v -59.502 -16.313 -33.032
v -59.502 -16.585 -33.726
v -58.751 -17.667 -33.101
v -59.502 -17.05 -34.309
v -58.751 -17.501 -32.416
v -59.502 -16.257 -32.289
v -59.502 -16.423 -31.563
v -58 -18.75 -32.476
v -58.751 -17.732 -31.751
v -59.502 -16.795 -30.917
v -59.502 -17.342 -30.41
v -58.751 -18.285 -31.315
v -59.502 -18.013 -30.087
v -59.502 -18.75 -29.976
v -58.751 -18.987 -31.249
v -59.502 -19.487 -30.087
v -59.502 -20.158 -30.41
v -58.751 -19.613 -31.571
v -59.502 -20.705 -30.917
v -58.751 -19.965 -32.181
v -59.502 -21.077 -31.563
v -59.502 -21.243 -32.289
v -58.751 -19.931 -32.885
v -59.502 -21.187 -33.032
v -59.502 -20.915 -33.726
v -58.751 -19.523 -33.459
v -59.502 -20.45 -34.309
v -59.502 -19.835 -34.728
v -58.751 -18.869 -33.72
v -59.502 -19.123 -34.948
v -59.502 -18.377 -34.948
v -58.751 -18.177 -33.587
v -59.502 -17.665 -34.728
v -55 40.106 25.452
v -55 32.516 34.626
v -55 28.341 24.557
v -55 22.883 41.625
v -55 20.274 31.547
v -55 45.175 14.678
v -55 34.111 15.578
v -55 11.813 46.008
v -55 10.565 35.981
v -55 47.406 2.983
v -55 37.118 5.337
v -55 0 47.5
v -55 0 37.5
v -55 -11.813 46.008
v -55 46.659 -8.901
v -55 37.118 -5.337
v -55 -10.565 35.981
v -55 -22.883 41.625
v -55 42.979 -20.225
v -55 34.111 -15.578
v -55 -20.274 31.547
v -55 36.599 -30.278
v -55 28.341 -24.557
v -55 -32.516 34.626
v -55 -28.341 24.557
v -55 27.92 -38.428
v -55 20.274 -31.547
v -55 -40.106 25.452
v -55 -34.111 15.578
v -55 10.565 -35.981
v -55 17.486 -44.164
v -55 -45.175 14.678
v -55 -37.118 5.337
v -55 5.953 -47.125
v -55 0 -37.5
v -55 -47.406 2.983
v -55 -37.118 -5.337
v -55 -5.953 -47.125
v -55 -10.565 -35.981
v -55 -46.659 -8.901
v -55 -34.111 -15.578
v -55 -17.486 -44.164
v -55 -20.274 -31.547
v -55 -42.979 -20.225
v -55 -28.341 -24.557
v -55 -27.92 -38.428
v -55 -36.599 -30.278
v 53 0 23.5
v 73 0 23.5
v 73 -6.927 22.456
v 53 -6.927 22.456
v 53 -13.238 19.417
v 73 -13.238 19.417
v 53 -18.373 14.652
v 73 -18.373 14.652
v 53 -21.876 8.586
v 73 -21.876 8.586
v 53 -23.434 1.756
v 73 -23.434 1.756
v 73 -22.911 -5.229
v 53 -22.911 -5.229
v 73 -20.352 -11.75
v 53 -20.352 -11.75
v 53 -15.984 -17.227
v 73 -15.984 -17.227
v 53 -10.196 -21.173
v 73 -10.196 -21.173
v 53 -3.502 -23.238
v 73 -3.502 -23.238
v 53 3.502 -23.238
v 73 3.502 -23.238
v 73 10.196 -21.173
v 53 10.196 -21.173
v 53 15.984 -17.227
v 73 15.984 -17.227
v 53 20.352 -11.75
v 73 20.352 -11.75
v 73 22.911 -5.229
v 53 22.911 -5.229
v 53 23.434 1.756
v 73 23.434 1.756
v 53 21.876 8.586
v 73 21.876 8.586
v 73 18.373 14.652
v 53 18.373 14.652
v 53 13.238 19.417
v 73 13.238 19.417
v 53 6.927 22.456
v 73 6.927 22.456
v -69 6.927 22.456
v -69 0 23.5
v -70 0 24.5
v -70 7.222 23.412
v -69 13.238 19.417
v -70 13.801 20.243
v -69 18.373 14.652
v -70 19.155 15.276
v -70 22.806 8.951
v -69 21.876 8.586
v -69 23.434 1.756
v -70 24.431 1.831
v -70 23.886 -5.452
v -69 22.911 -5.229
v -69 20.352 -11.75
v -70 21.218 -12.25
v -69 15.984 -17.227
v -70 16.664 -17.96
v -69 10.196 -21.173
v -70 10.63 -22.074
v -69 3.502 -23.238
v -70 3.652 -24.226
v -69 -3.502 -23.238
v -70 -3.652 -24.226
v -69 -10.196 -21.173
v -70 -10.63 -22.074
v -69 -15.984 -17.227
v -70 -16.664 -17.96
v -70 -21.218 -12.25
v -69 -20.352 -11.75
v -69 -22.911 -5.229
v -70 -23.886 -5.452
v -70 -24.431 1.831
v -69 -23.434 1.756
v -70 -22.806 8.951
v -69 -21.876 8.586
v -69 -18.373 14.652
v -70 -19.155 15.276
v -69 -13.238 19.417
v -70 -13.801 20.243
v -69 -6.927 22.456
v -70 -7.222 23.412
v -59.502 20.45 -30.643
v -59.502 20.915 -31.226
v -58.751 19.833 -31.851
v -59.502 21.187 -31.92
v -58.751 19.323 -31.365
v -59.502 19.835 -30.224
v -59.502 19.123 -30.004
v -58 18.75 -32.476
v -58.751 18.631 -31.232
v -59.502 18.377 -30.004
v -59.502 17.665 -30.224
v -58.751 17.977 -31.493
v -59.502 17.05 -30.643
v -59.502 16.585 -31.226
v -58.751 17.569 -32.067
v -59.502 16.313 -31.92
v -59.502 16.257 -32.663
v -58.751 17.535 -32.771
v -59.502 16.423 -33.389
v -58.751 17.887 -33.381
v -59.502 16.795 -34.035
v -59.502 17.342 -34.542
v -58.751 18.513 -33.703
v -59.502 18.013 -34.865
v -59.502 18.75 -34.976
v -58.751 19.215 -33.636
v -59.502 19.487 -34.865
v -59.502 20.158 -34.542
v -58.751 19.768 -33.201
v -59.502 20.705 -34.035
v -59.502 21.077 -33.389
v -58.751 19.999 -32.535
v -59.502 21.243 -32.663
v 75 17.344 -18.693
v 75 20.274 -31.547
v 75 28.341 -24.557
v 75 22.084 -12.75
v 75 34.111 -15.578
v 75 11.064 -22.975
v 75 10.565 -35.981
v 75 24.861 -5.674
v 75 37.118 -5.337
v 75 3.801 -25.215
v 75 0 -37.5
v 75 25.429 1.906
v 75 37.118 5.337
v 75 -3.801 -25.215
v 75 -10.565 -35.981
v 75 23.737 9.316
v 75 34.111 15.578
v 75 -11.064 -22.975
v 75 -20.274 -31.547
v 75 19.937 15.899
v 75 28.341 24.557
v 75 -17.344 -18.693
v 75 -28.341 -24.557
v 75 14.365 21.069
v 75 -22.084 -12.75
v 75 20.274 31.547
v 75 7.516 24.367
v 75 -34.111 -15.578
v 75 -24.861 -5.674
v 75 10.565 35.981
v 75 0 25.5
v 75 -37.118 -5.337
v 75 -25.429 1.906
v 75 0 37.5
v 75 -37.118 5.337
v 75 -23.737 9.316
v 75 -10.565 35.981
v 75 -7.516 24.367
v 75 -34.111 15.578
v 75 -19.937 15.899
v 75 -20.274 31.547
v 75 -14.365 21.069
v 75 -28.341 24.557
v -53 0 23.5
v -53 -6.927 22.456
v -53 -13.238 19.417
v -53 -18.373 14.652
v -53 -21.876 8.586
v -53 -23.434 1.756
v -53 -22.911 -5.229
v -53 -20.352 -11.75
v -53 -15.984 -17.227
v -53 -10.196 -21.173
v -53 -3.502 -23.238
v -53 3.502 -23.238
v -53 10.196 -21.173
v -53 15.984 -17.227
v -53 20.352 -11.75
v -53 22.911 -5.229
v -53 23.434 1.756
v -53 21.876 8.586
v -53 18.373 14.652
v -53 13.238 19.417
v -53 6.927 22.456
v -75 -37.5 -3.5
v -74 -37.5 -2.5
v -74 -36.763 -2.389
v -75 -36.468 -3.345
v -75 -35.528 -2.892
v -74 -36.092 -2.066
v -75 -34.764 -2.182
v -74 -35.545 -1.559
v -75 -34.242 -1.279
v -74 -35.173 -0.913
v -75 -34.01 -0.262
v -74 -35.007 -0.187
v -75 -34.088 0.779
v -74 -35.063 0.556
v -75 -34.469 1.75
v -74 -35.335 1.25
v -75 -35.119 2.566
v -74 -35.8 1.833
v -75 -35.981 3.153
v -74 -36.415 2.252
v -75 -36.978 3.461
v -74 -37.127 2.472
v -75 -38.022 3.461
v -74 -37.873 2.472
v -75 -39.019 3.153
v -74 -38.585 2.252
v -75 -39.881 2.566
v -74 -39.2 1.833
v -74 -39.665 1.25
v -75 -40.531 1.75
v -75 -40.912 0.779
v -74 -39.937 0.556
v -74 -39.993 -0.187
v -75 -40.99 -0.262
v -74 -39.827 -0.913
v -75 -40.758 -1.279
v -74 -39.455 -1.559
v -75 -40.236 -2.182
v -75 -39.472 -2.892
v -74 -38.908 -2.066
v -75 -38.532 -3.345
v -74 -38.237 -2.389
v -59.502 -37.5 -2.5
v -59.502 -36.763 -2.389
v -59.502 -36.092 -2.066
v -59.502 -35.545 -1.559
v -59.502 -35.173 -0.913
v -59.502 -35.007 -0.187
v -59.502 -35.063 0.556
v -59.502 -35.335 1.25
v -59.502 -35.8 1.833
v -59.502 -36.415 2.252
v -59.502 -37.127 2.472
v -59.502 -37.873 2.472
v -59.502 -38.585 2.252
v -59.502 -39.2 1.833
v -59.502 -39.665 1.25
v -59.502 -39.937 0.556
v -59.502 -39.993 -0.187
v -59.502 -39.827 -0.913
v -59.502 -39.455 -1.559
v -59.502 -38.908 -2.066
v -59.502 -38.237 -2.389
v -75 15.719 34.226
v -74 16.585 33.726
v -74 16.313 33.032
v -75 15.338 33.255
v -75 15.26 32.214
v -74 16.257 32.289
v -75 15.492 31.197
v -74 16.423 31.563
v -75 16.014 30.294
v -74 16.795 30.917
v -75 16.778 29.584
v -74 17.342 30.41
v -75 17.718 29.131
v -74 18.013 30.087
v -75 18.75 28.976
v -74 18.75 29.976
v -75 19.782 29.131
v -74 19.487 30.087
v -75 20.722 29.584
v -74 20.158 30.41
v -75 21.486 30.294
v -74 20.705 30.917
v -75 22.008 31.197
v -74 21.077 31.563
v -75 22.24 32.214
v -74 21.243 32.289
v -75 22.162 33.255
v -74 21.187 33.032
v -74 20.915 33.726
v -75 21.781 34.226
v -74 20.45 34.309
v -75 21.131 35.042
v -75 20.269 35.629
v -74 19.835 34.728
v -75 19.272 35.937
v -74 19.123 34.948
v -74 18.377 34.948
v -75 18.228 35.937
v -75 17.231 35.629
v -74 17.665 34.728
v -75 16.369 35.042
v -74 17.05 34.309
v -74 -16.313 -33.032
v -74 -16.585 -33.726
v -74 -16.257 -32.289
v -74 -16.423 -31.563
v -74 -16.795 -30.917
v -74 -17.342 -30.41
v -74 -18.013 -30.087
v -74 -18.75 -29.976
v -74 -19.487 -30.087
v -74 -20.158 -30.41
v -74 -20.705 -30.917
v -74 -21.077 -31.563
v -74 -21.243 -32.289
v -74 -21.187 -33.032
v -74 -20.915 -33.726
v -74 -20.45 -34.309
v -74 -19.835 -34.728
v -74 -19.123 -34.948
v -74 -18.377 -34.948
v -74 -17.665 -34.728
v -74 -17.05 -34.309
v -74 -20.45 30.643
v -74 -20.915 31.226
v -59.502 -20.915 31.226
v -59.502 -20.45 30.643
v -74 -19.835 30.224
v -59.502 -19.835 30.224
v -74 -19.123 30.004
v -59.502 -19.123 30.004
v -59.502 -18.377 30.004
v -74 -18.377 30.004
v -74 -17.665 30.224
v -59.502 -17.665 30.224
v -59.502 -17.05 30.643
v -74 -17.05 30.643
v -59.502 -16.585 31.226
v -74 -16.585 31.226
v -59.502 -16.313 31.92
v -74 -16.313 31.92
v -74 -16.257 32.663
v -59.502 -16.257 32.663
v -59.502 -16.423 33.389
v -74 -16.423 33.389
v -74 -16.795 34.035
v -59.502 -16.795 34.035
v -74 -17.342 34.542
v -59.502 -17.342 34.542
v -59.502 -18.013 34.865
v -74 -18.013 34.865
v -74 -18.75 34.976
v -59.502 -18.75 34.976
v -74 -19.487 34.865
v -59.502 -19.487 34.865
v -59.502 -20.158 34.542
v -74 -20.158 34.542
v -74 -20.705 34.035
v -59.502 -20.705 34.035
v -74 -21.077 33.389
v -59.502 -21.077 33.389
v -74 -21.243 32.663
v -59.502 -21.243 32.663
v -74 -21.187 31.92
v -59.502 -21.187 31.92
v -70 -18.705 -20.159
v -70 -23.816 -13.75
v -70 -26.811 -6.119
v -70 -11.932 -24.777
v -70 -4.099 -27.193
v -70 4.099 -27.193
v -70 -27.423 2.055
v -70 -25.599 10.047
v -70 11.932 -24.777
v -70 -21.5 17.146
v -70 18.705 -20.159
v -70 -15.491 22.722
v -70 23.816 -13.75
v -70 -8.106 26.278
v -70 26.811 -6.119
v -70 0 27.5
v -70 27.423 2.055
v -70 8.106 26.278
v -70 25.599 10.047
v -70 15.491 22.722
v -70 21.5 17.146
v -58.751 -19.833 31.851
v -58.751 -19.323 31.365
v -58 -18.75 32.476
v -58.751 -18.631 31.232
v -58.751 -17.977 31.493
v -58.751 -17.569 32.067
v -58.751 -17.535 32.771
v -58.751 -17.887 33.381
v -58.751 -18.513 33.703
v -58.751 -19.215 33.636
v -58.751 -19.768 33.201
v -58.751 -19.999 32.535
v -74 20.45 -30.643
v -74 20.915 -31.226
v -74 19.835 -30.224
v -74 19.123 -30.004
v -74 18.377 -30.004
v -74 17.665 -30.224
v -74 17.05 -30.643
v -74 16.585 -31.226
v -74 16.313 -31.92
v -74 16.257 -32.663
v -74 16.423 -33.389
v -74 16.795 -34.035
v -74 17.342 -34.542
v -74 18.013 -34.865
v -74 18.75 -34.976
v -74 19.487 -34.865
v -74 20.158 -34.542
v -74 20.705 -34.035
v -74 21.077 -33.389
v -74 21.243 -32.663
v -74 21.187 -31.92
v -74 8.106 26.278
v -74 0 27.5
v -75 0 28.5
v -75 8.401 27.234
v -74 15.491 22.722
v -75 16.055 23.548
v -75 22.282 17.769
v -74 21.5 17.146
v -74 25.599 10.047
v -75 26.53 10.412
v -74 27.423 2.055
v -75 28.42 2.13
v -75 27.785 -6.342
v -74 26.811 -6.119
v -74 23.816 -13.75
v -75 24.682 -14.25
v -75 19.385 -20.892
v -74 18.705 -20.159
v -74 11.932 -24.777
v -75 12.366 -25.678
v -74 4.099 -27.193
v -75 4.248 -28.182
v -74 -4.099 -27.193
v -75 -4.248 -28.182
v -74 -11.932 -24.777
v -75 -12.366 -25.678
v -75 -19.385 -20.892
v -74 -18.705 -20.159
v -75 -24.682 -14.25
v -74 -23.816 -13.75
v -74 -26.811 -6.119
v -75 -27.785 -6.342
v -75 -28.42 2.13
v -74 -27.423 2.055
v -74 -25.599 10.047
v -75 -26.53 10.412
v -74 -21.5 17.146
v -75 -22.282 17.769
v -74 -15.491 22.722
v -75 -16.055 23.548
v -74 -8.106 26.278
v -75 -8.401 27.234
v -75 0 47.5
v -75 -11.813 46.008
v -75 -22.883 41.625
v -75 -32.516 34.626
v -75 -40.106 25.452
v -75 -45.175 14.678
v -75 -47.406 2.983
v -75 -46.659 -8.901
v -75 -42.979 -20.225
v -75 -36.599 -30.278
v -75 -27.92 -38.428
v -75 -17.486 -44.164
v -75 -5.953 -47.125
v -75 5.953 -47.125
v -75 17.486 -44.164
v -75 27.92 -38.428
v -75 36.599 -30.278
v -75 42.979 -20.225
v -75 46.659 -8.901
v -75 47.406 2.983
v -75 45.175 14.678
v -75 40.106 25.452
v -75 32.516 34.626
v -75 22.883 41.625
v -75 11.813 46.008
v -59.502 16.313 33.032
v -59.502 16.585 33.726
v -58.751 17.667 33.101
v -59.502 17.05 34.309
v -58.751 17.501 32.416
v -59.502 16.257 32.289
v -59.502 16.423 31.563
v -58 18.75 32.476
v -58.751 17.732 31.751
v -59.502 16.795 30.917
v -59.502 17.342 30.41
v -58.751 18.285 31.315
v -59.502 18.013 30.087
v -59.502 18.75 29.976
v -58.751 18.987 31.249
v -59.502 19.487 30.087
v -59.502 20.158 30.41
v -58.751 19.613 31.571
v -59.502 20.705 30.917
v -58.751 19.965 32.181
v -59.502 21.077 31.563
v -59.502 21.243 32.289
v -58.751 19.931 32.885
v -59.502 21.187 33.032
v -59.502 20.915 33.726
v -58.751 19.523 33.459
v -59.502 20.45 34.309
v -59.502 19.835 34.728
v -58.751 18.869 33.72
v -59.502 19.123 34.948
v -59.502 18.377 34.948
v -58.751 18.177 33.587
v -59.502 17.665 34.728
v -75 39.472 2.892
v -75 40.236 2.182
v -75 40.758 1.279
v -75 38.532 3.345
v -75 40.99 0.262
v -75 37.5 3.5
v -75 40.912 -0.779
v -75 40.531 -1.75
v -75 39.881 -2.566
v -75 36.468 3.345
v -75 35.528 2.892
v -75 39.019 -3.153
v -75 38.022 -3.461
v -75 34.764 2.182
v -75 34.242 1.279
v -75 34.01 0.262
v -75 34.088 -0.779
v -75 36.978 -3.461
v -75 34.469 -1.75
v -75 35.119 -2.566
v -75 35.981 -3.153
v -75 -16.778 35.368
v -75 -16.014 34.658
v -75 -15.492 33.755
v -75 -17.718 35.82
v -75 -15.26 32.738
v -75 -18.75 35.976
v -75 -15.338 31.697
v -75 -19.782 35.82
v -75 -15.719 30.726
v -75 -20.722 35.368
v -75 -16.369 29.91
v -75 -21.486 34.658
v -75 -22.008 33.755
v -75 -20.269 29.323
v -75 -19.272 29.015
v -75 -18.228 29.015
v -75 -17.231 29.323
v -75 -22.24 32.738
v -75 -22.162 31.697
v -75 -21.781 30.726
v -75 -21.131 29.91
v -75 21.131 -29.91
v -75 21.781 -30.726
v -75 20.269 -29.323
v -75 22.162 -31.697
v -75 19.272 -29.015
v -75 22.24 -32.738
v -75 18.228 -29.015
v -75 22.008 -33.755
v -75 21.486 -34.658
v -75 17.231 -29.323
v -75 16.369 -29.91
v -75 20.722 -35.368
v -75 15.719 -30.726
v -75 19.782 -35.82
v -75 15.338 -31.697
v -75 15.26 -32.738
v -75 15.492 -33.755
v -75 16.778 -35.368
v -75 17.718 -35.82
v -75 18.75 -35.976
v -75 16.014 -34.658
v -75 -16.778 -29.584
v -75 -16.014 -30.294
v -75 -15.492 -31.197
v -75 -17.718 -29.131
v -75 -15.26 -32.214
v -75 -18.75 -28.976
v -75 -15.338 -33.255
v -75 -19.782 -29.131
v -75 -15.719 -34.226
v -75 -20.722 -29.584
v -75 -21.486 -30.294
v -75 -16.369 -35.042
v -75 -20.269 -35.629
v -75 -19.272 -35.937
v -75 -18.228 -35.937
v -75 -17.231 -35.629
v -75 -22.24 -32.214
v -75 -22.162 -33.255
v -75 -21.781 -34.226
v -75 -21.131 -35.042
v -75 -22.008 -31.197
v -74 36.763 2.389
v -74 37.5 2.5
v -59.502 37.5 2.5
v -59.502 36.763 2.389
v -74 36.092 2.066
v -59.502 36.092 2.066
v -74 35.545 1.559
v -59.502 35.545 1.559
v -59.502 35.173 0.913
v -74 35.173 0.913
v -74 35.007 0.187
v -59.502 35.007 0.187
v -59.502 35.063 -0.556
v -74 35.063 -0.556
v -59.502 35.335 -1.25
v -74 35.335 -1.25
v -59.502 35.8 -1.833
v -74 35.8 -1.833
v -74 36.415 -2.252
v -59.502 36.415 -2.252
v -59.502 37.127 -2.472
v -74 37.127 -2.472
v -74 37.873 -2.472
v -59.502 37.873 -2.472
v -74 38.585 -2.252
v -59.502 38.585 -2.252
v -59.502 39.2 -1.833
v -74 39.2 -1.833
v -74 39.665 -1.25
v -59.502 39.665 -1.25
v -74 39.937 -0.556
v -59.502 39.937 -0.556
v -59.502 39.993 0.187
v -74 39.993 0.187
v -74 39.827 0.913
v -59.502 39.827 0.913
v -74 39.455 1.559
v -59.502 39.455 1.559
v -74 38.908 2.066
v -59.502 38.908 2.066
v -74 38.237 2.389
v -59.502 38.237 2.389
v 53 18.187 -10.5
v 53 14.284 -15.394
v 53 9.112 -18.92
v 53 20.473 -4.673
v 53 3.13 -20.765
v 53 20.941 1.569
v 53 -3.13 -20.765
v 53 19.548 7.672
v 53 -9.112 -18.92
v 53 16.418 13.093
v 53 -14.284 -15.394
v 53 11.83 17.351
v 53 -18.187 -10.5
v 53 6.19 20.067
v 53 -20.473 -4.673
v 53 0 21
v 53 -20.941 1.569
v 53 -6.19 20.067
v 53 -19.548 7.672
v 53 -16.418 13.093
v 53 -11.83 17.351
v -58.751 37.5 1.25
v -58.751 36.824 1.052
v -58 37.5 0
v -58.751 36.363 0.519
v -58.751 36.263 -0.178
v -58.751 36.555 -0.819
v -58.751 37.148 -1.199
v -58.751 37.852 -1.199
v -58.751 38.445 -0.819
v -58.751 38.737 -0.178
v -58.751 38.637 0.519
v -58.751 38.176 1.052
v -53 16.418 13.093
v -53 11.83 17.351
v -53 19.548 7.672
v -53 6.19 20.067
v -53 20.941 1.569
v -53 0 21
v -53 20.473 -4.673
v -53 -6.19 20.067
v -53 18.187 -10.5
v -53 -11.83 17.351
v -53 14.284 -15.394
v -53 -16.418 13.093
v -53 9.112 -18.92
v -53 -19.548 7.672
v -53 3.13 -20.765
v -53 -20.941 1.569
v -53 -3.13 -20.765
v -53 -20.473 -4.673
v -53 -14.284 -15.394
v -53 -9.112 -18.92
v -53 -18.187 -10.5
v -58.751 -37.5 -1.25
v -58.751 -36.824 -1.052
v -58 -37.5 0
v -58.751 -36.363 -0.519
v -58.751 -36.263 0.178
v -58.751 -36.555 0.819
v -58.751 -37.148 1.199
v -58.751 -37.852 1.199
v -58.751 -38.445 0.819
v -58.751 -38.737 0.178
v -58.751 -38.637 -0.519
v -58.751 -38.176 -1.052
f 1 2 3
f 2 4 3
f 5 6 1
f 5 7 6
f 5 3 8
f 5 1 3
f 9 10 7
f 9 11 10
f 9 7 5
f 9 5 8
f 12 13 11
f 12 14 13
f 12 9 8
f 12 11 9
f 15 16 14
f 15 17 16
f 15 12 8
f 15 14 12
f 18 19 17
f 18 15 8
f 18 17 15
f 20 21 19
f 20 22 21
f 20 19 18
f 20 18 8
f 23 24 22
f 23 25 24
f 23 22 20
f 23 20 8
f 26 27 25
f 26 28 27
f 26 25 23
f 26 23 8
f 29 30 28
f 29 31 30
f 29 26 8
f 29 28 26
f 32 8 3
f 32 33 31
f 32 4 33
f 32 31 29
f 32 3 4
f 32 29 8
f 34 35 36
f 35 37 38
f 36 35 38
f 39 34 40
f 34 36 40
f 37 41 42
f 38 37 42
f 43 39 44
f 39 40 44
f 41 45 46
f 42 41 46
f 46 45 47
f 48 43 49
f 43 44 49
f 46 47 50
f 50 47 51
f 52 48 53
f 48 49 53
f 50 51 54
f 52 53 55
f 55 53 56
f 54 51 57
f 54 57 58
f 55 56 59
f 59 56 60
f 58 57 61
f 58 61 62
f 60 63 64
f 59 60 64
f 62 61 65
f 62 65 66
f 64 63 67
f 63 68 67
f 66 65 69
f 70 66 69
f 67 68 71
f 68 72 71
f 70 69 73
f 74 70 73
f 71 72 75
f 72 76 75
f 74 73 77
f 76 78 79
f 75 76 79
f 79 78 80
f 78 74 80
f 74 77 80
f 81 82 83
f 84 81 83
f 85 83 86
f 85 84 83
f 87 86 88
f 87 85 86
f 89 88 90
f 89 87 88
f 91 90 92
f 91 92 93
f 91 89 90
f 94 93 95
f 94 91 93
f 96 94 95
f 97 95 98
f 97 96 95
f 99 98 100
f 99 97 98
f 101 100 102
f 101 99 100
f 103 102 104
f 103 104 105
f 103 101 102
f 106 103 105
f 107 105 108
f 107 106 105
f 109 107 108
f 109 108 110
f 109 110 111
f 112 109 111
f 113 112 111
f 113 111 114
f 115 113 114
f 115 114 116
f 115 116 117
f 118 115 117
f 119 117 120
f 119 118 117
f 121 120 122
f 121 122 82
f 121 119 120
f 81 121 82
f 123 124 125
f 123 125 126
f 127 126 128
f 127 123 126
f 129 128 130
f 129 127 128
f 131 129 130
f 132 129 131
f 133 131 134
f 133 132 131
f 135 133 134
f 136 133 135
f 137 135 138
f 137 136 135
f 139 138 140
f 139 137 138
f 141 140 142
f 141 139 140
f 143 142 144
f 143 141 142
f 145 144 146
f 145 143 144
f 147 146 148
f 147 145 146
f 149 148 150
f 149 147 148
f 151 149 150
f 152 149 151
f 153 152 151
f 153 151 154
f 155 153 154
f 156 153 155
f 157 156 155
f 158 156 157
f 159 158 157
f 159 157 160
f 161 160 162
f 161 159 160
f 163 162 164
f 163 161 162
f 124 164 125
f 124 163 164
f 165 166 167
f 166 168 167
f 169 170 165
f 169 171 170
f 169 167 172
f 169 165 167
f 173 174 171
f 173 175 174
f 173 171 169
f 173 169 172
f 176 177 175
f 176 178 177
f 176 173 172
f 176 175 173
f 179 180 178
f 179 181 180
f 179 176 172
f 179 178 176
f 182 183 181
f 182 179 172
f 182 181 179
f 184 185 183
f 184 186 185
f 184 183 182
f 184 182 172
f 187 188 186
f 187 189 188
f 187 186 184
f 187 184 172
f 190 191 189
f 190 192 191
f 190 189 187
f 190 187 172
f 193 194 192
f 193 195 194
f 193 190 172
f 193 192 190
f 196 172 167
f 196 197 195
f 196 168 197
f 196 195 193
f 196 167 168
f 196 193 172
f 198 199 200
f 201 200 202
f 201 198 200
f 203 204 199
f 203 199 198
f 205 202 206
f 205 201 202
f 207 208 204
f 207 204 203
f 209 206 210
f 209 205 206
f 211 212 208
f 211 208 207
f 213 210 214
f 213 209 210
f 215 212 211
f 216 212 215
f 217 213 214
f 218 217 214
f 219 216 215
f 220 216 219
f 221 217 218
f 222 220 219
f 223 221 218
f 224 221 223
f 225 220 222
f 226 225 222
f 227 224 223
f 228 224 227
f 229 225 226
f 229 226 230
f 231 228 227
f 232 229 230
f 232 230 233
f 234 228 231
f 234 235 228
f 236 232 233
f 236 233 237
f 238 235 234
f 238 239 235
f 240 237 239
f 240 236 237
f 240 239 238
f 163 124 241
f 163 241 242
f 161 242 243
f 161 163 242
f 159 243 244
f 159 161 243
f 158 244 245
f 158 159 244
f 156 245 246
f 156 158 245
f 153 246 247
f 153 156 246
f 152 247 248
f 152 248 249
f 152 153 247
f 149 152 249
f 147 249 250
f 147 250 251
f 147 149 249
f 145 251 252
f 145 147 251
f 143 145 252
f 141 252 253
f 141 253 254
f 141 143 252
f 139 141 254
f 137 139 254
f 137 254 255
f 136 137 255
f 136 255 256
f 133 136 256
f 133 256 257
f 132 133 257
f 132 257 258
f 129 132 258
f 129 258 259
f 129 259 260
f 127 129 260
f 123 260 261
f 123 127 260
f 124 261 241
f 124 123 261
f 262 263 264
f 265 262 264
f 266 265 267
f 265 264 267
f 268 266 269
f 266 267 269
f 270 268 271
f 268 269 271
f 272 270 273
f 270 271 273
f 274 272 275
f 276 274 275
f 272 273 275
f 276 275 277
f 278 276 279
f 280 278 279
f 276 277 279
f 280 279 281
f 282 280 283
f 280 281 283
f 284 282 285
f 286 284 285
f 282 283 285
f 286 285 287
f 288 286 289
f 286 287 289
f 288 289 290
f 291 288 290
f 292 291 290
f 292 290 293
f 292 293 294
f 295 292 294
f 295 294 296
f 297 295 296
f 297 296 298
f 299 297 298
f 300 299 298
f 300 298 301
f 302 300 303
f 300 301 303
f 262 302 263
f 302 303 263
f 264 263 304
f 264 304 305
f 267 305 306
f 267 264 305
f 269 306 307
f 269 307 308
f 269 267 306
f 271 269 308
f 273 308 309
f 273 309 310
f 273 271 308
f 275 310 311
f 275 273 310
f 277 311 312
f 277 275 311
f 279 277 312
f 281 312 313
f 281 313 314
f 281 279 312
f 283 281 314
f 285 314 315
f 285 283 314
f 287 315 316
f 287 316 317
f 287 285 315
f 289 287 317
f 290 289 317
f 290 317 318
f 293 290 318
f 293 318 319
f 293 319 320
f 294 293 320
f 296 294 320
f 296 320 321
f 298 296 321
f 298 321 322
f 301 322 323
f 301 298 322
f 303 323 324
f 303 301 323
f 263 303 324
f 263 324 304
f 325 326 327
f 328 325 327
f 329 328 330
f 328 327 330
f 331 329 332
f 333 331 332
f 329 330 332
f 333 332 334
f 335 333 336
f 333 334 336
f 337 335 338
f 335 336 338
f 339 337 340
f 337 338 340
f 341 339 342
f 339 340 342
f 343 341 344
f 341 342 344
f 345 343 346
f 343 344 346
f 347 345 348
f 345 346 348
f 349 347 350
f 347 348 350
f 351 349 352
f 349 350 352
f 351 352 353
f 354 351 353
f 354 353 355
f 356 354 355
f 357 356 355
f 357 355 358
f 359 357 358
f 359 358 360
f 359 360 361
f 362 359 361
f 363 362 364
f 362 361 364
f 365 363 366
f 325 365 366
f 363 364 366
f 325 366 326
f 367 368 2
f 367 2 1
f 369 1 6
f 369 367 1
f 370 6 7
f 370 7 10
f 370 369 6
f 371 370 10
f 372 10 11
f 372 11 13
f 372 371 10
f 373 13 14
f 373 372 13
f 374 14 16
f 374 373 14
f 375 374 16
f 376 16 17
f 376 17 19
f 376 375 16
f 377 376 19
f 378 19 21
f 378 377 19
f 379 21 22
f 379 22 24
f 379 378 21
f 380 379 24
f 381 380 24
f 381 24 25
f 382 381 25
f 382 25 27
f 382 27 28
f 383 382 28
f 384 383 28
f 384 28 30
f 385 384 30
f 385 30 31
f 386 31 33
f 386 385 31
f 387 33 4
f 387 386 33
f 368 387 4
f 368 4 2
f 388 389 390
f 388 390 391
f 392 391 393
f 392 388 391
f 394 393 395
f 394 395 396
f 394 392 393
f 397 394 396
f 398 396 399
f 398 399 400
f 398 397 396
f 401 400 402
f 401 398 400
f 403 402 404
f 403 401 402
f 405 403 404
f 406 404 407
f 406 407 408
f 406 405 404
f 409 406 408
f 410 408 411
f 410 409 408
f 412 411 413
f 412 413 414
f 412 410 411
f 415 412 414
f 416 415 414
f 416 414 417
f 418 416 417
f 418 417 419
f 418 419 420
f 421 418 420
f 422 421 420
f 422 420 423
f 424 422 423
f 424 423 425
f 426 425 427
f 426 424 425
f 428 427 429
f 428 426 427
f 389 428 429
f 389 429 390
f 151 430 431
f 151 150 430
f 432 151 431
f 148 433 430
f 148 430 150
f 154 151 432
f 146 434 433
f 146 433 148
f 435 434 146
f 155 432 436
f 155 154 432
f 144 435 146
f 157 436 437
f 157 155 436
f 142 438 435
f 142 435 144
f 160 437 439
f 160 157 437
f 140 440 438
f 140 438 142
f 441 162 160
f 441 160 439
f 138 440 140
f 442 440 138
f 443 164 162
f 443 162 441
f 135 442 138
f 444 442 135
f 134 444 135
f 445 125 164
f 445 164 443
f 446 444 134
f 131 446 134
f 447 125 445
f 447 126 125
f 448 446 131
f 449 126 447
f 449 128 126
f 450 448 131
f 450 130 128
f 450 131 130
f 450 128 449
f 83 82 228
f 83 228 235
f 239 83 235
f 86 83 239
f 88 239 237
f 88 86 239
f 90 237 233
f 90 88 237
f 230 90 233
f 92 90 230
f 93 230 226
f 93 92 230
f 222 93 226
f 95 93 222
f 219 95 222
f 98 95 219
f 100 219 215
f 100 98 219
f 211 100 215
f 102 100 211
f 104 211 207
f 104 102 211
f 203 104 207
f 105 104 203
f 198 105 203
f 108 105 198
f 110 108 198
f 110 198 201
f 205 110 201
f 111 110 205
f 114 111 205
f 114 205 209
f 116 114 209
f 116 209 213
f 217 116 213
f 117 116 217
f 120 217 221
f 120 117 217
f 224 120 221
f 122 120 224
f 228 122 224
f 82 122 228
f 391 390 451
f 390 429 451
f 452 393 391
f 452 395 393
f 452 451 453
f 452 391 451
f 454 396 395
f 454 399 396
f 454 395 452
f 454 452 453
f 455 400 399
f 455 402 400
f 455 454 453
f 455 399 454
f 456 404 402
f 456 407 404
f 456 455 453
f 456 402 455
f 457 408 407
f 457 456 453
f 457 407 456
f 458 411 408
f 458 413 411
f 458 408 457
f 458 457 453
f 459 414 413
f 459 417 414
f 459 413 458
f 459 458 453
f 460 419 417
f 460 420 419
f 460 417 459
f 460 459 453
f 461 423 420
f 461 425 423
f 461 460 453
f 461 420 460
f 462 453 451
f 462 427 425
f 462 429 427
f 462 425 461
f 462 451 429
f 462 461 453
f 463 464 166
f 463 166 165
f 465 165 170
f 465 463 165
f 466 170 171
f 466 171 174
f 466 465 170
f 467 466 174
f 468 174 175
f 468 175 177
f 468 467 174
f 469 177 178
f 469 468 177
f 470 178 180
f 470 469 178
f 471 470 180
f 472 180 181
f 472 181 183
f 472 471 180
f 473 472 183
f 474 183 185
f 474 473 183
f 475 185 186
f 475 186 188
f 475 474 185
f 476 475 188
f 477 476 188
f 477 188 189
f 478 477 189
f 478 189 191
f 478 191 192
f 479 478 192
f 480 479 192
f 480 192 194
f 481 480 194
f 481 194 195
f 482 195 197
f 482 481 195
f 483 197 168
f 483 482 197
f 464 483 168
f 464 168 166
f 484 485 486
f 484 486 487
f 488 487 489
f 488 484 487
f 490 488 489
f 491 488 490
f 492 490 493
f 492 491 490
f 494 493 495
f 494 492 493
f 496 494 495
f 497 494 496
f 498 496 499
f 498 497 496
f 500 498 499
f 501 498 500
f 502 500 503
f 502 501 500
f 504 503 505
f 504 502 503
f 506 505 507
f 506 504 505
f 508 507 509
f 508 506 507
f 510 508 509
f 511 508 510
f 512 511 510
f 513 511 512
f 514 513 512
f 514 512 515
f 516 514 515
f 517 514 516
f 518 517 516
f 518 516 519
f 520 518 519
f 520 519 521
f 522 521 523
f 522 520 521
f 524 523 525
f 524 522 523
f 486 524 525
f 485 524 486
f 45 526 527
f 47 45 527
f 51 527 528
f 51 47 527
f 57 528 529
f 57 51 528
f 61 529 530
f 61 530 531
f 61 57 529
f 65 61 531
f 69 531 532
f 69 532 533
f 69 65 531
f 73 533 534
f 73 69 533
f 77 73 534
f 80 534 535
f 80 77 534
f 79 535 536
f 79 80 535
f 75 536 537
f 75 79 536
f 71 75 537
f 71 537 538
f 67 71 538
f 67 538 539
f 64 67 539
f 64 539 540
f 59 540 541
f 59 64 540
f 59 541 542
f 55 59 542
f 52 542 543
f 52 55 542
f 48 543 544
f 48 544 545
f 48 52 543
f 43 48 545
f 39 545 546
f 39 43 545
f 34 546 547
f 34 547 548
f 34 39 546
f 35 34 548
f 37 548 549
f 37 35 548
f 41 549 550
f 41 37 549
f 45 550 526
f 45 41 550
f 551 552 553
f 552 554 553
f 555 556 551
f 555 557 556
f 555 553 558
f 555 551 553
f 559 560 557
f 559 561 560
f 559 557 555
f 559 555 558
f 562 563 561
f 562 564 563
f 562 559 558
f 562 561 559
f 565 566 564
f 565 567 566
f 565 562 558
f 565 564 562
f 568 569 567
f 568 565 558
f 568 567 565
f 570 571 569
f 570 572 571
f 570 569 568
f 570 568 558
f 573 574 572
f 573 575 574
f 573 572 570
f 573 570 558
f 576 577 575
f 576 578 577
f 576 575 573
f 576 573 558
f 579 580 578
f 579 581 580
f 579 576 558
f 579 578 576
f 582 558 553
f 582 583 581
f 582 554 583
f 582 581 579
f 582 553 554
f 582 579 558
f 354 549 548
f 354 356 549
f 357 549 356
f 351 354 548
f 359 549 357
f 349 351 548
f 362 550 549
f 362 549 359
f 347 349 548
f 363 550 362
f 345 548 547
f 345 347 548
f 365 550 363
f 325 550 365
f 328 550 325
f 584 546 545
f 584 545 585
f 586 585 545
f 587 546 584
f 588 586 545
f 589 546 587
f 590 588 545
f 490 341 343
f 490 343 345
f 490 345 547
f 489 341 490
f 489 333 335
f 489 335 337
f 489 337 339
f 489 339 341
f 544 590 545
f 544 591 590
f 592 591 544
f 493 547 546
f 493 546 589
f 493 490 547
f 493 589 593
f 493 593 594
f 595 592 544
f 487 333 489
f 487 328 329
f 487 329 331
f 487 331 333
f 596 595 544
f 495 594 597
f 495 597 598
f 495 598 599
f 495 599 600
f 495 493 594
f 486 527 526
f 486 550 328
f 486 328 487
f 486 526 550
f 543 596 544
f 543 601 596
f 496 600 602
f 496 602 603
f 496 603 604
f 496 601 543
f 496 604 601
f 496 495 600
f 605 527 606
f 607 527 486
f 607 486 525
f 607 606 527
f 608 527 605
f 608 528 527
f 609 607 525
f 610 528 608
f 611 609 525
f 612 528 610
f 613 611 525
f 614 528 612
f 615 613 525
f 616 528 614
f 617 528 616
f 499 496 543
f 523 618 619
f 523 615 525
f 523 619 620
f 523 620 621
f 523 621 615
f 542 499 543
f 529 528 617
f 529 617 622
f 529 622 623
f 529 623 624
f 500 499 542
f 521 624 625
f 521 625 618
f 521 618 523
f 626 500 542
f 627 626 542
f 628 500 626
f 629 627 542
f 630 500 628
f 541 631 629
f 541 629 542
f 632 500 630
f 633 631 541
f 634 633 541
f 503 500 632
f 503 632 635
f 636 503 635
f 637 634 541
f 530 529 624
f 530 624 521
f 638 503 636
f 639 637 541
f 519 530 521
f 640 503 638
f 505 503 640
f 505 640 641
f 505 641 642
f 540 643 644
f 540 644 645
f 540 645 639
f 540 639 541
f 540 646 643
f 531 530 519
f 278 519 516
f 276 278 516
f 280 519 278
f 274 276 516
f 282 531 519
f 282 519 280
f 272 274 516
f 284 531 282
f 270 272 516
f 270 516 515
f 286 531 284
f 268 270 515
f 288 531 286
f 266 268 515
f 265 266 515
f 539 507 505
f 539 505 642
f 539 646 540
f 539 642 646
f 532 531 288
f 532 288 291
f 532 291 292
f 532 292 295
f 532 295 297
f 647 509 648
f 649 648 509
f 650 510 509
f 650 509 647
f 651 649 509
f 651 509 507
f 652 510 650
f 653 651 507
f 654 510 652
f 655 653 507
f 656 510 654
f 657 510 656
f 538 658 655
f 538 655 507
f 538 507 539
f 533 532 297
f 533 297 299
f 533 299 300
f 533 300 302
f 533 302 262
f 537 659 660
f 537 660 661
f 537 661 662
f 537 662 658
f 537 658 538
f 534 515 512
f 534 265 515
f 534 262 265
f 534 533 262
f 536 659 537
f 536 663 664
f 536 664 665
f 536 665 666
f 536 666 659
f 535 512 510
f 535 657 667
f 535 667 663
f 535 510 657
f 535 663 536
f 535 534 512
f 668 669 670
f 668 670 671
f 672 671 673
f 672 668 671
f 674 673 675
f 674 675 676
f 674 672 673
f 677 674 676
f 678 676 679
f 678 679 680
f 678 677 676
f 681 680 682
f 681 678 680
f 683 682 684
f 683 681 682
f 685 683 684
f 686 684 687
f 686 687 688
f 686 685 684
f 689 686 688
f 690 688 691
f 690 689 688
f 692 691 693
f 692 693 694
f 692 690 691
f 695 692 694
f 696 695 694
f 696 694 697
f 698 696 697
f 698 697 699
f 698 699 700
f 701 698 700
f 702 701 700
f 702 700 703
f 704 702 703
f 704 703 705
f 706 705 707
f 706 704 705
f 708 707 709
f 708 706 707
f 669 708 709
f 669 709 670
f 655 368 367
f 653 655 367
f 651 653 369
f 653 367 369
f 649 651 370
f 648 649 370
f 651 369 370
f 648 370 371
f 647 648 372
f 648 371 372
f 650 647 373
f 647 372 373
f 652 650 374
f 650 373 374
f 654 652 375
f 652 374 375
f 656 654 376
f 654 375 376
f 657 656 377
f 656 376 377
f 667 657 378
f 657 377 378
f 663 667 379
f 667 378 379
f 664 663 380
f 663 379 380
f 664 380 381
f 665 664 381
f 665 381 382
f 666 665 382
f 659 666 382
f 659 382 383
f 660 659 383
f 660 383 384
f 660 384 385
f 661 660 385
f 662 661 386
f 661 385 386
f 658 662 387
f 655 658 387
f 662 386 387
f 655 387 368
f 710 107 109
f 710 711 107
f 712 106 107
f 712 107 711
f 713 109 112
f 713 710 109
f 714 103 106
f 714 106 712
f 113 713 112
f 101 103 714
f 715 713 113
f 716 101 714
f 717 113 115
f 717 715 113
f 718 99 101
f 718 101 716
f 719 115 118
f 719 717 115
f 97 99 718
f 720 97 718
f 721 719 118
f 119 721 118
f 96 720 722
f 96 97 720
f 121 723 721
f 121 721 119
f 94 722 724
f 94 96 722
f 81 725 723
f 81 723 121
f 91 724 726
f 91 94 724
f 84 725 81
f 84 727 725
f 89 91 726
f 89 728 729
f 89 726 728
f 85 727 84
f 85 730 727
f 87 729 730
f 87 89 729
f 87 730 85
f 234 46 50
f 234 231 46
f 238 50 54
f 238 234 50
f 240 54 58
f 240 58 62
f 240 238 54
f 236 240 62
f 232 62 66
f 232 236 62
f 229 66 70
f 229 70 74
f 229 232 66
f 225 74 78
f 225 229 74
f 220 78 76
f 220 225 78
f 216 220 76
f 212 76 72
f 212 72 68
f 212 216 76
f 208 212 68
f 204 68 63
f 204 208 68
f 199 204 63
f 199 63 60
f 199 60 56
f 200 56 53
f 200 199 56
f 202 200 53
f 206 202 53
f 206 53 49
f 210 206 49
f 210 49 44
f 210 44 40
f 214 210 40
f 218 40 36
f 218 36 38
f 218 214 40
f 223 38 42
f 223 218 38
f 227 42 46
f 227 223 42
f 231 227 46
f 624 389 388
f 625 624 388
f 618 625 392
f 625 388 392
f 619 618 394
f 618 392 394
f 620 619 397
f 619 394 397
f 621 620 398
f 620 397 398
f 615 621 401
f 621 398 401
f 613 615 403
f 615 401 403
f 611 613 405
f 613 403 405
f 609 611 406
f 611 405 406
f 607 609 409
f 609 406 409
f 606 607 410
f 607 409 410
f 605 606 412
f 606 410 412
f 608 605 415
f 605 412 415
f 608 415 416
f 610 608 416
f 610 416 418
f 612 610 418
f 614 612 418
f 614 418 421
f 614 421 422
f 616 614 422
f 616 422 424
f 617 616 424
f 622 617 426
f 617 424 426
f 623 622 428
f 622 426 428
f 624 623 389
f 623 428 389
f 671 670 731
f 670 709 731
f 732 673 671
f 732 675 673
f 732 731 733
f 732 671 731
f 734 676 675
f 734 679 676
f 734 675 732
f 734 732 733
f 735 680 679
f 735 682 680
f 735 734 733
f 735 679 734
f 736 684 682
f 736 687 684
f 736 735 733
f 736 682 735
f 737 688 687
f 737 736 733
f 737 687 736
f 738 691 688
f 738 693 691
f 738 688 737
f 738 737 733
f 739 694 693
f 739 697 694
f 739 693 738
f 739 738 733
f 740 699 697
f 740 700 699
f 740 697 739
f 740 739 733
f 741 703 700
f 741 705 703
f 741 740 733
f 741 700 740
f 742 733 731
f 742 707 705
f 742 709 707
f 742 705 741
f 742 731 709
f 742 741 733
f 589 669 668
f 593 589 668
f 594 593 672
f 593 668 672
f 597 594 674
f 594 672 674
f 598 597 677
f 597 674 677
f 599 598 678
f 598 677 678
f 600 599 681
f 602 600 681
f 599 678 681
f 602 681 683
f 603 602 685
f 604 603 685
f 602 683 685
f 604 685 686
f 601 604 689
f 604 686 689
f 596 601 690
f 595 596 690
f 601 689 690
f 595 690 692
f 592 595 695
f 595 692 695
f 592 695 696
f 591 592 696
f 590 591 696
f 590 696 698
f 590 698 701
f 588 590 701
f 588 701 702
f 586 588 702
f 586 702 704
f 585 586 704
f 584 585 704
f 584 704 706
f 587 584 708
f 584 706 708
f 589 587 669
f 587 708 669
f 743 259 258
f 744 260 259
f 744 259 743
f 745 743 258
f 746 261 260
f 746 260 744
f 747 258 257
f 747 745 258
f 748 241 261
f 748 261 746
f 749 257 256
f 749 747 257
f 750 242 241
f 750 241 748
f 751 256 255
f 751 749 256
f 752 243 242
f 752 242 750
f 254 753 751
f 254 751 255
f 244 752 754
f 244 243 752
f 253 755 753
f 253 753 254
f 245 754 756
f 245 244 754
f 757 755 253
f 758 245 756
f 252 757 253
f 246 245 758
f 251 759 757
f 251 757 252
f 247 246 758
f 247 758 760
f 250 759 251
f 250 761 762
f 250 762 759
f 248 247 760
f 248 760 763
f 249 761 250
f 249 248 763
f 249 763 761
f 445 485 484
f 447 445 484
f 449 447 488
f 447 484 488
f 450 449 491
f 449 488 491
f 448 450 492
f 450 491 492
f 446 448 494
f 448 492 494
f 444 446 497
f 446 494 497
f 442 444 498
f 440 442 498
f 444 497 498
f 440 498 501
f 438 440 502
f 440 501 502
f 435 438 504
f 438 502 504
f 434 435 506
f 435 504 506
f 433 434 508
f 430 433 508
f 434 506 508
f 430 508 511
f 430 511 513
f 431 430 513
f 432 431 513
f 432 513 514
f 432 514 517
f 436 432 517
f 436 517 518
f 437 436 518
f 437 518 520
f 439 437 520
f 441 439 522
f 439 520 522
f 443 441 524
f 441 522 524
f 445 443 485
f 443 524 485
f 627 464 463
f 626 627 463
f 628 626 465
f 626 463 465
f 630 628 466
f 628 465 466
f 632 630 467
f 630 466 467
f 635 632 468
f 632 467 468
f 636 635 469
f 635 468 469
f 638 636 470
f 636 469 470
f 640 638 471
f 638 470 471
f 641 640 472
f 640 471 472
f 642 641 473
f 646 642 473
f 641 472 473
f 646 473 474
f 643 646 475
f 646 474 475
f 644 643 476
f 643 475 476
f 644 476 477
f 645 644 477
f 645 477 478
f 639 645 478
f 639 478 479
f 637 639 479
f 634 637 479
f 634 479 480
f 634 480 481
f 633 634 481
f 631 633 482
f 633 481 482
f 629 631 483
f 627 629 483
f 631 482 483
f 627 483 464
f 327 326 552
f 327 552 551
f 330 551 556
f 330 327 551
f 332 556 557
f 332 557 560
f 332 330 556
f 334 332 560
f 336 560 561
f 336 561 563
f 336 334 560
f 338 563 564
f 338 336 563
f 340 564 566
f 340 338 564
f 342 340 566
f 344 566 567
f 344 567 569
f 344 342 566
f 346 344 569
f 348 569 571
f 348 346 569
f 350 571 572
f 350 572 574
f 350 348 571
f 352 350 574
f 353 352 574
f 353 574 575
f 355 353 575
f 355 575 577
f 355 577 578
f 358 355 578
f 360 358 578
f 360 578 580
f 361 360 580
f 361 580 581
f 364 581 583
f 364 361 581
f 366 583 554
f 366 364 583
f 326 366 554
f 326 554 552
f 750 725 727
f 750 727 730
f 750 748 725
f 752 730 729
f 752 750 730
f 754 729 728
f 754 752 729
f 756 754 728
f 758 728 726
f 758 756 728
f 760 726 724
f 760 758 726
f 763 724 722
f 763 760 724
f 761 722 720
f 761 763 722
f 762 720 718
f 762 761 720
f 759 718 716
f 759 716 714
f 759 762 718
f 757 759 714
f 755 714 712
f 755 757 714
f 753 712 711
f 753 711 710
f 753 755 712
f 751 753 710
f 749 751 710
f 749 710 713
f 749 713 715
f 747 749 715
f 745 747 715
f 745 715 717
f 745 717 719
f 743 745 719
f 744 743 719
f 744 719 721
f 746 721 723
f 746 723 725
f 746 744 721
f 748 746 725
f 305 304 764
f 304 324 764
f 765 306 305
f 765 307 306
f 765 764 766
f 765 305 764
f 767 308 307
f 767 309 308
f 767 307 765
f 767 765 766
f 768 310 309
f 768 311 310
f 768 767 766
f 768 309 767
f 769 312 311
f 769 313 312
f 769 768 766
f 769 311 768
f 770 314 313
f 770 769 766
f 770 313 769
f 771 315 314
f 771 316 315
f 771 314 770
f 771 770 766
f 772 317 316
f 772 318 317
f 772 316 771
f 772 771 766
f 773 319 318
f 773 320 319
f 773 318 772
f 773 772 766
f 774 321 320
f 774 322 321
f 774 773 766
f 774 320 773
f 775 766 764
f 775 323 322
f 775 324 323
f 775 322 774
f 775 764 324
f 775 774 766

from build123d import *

# Parameters (mm, degrees)
PATTERN_CIRCULAR_1_COUNT = 6
CHAMFER_2_SIZE           = 1
CHAMFER_1_SIZE           = 2
SKETCH_5_W               = 130
SKETCH_5_H               = 10
SKETCH_6_R               = 27.5
SKETCH_6_R_2             = 23.5
CUT_EXTRUDE_1_DEPTH      = 5
CHAMFER_3_SIZE           = 1


with BuildPart() as part:
    # Эскиз1 → Повернуть1 (revolve)
    with BuildSketch(Plane.XY, mode=Mode.PRIVATE) as revolve_1_sk:
        Polygon((-75, 23.5), (-75, 47.5), (75, 47.5), (75, 23.5), (53, 23.5), (53, 21), (-53, 21), (-53, 23.5), align=None)
    revolve(revolve_1_sk.sketch.rotate(Axis((0, 0, 0), (1, 0, 0)), 90), axis=Axis((0, 0, 0), (1, 0, 0)))

    # Эскиз3 → Отверстие обработанное метчиком M61 (revolve, cut)
    with BuildSketch(Plane(origin=(-75, 37.5, 0), x_dir=(0, 0, 1), z_dir=(0, 1, 0))):
        Polygon((0, 0), (0, 17), (2.5, 15.497848452), (2.5, 0), align=None)
    hole_wizard_m61 = revolve(axis=Axis((-81.35, 37.5, 0), (1, 0, 0)), mode=Mode.SUBTRACT)

    # Круговой массив1: Отверстие обработанное метчиком M61 ×6 about axis
    pattern_circular_1_axis = Axis((0, 0, 0), (1, 0, 0))
    for i in range(1, PATTERN_CIRCULAR_1_COUNT):
        add(hole_wizard_m61.rotate(pattern_circular_1_axis, i * 360 / PATTERN_CIRCULAR_1_COUNT), mode=Mode.SUBTRACT)

    # Фаска2
    chamfer_2_edges = [part.edges().sort_by_distance(p)[0] for p in [
        (-75, 37.5, -2.5),
        (-75, 16.584936491, -33.725952642),
        (-75, -20.915063509, -31.225952642),
        (-75, -37.5, 2.5),
        (-75, -16.584936491, 33.725952642),
        (-75, 20.915063509, 31.225952642),
    ]]
    chamfer(chamfer_2_edges, length=CHAMFER_2_SIZE)

    # Фаска1
    chamfer_1_edges = [part.edges().sort_by_distance(p)[0] for p in [
        (75, 0, -23.5),
    ]]
    chamfer(chamfer_1_edges, length=CHAMFER_1_SIZE)

    # Эскиз5 → Вырез-Повернуть1 (revolve, cut)
    with BuildSketch(Plane.XY, mode=Mode.PRIVATE) as cut_revolve_1_sk:
        with Locations((10, 42.5)):
            Rectangle(SKETCH_5_W, SKETCH_5_H)
    revolve(cut_revolve_1_sk.sketch.rotate(Axis((-75, 0, 0), (1, 0, 0)), 90), axis=Axis((-75, 0, 0), (1, 0, 0)), mode=Mode.SUBTRACT)

    # Эскиз6 → Вырез-Вытянуть1 (cut)
    with BuildSketch(Plane.ZY.offset(75)):
        Circle(SKETCH_6_R)
        Circle(SKETCH_6_R_2, mode=Mode.SUBTRACT)
    extrude(amount=-CUT_EXTRUDE_1_DEPTH, mode=Mode.SUBTRACT)

    # Фаска3
    chamfer_3_edges = [part.edges().sort_by_distance(p)[0] for p in [
        (-70, 0, -23.5),
        (-75, 0, -27.5),
    ]]
    chamfer(chamfer_3_edges, length=CHAMFER_3_SIZE)


solid = part.part
